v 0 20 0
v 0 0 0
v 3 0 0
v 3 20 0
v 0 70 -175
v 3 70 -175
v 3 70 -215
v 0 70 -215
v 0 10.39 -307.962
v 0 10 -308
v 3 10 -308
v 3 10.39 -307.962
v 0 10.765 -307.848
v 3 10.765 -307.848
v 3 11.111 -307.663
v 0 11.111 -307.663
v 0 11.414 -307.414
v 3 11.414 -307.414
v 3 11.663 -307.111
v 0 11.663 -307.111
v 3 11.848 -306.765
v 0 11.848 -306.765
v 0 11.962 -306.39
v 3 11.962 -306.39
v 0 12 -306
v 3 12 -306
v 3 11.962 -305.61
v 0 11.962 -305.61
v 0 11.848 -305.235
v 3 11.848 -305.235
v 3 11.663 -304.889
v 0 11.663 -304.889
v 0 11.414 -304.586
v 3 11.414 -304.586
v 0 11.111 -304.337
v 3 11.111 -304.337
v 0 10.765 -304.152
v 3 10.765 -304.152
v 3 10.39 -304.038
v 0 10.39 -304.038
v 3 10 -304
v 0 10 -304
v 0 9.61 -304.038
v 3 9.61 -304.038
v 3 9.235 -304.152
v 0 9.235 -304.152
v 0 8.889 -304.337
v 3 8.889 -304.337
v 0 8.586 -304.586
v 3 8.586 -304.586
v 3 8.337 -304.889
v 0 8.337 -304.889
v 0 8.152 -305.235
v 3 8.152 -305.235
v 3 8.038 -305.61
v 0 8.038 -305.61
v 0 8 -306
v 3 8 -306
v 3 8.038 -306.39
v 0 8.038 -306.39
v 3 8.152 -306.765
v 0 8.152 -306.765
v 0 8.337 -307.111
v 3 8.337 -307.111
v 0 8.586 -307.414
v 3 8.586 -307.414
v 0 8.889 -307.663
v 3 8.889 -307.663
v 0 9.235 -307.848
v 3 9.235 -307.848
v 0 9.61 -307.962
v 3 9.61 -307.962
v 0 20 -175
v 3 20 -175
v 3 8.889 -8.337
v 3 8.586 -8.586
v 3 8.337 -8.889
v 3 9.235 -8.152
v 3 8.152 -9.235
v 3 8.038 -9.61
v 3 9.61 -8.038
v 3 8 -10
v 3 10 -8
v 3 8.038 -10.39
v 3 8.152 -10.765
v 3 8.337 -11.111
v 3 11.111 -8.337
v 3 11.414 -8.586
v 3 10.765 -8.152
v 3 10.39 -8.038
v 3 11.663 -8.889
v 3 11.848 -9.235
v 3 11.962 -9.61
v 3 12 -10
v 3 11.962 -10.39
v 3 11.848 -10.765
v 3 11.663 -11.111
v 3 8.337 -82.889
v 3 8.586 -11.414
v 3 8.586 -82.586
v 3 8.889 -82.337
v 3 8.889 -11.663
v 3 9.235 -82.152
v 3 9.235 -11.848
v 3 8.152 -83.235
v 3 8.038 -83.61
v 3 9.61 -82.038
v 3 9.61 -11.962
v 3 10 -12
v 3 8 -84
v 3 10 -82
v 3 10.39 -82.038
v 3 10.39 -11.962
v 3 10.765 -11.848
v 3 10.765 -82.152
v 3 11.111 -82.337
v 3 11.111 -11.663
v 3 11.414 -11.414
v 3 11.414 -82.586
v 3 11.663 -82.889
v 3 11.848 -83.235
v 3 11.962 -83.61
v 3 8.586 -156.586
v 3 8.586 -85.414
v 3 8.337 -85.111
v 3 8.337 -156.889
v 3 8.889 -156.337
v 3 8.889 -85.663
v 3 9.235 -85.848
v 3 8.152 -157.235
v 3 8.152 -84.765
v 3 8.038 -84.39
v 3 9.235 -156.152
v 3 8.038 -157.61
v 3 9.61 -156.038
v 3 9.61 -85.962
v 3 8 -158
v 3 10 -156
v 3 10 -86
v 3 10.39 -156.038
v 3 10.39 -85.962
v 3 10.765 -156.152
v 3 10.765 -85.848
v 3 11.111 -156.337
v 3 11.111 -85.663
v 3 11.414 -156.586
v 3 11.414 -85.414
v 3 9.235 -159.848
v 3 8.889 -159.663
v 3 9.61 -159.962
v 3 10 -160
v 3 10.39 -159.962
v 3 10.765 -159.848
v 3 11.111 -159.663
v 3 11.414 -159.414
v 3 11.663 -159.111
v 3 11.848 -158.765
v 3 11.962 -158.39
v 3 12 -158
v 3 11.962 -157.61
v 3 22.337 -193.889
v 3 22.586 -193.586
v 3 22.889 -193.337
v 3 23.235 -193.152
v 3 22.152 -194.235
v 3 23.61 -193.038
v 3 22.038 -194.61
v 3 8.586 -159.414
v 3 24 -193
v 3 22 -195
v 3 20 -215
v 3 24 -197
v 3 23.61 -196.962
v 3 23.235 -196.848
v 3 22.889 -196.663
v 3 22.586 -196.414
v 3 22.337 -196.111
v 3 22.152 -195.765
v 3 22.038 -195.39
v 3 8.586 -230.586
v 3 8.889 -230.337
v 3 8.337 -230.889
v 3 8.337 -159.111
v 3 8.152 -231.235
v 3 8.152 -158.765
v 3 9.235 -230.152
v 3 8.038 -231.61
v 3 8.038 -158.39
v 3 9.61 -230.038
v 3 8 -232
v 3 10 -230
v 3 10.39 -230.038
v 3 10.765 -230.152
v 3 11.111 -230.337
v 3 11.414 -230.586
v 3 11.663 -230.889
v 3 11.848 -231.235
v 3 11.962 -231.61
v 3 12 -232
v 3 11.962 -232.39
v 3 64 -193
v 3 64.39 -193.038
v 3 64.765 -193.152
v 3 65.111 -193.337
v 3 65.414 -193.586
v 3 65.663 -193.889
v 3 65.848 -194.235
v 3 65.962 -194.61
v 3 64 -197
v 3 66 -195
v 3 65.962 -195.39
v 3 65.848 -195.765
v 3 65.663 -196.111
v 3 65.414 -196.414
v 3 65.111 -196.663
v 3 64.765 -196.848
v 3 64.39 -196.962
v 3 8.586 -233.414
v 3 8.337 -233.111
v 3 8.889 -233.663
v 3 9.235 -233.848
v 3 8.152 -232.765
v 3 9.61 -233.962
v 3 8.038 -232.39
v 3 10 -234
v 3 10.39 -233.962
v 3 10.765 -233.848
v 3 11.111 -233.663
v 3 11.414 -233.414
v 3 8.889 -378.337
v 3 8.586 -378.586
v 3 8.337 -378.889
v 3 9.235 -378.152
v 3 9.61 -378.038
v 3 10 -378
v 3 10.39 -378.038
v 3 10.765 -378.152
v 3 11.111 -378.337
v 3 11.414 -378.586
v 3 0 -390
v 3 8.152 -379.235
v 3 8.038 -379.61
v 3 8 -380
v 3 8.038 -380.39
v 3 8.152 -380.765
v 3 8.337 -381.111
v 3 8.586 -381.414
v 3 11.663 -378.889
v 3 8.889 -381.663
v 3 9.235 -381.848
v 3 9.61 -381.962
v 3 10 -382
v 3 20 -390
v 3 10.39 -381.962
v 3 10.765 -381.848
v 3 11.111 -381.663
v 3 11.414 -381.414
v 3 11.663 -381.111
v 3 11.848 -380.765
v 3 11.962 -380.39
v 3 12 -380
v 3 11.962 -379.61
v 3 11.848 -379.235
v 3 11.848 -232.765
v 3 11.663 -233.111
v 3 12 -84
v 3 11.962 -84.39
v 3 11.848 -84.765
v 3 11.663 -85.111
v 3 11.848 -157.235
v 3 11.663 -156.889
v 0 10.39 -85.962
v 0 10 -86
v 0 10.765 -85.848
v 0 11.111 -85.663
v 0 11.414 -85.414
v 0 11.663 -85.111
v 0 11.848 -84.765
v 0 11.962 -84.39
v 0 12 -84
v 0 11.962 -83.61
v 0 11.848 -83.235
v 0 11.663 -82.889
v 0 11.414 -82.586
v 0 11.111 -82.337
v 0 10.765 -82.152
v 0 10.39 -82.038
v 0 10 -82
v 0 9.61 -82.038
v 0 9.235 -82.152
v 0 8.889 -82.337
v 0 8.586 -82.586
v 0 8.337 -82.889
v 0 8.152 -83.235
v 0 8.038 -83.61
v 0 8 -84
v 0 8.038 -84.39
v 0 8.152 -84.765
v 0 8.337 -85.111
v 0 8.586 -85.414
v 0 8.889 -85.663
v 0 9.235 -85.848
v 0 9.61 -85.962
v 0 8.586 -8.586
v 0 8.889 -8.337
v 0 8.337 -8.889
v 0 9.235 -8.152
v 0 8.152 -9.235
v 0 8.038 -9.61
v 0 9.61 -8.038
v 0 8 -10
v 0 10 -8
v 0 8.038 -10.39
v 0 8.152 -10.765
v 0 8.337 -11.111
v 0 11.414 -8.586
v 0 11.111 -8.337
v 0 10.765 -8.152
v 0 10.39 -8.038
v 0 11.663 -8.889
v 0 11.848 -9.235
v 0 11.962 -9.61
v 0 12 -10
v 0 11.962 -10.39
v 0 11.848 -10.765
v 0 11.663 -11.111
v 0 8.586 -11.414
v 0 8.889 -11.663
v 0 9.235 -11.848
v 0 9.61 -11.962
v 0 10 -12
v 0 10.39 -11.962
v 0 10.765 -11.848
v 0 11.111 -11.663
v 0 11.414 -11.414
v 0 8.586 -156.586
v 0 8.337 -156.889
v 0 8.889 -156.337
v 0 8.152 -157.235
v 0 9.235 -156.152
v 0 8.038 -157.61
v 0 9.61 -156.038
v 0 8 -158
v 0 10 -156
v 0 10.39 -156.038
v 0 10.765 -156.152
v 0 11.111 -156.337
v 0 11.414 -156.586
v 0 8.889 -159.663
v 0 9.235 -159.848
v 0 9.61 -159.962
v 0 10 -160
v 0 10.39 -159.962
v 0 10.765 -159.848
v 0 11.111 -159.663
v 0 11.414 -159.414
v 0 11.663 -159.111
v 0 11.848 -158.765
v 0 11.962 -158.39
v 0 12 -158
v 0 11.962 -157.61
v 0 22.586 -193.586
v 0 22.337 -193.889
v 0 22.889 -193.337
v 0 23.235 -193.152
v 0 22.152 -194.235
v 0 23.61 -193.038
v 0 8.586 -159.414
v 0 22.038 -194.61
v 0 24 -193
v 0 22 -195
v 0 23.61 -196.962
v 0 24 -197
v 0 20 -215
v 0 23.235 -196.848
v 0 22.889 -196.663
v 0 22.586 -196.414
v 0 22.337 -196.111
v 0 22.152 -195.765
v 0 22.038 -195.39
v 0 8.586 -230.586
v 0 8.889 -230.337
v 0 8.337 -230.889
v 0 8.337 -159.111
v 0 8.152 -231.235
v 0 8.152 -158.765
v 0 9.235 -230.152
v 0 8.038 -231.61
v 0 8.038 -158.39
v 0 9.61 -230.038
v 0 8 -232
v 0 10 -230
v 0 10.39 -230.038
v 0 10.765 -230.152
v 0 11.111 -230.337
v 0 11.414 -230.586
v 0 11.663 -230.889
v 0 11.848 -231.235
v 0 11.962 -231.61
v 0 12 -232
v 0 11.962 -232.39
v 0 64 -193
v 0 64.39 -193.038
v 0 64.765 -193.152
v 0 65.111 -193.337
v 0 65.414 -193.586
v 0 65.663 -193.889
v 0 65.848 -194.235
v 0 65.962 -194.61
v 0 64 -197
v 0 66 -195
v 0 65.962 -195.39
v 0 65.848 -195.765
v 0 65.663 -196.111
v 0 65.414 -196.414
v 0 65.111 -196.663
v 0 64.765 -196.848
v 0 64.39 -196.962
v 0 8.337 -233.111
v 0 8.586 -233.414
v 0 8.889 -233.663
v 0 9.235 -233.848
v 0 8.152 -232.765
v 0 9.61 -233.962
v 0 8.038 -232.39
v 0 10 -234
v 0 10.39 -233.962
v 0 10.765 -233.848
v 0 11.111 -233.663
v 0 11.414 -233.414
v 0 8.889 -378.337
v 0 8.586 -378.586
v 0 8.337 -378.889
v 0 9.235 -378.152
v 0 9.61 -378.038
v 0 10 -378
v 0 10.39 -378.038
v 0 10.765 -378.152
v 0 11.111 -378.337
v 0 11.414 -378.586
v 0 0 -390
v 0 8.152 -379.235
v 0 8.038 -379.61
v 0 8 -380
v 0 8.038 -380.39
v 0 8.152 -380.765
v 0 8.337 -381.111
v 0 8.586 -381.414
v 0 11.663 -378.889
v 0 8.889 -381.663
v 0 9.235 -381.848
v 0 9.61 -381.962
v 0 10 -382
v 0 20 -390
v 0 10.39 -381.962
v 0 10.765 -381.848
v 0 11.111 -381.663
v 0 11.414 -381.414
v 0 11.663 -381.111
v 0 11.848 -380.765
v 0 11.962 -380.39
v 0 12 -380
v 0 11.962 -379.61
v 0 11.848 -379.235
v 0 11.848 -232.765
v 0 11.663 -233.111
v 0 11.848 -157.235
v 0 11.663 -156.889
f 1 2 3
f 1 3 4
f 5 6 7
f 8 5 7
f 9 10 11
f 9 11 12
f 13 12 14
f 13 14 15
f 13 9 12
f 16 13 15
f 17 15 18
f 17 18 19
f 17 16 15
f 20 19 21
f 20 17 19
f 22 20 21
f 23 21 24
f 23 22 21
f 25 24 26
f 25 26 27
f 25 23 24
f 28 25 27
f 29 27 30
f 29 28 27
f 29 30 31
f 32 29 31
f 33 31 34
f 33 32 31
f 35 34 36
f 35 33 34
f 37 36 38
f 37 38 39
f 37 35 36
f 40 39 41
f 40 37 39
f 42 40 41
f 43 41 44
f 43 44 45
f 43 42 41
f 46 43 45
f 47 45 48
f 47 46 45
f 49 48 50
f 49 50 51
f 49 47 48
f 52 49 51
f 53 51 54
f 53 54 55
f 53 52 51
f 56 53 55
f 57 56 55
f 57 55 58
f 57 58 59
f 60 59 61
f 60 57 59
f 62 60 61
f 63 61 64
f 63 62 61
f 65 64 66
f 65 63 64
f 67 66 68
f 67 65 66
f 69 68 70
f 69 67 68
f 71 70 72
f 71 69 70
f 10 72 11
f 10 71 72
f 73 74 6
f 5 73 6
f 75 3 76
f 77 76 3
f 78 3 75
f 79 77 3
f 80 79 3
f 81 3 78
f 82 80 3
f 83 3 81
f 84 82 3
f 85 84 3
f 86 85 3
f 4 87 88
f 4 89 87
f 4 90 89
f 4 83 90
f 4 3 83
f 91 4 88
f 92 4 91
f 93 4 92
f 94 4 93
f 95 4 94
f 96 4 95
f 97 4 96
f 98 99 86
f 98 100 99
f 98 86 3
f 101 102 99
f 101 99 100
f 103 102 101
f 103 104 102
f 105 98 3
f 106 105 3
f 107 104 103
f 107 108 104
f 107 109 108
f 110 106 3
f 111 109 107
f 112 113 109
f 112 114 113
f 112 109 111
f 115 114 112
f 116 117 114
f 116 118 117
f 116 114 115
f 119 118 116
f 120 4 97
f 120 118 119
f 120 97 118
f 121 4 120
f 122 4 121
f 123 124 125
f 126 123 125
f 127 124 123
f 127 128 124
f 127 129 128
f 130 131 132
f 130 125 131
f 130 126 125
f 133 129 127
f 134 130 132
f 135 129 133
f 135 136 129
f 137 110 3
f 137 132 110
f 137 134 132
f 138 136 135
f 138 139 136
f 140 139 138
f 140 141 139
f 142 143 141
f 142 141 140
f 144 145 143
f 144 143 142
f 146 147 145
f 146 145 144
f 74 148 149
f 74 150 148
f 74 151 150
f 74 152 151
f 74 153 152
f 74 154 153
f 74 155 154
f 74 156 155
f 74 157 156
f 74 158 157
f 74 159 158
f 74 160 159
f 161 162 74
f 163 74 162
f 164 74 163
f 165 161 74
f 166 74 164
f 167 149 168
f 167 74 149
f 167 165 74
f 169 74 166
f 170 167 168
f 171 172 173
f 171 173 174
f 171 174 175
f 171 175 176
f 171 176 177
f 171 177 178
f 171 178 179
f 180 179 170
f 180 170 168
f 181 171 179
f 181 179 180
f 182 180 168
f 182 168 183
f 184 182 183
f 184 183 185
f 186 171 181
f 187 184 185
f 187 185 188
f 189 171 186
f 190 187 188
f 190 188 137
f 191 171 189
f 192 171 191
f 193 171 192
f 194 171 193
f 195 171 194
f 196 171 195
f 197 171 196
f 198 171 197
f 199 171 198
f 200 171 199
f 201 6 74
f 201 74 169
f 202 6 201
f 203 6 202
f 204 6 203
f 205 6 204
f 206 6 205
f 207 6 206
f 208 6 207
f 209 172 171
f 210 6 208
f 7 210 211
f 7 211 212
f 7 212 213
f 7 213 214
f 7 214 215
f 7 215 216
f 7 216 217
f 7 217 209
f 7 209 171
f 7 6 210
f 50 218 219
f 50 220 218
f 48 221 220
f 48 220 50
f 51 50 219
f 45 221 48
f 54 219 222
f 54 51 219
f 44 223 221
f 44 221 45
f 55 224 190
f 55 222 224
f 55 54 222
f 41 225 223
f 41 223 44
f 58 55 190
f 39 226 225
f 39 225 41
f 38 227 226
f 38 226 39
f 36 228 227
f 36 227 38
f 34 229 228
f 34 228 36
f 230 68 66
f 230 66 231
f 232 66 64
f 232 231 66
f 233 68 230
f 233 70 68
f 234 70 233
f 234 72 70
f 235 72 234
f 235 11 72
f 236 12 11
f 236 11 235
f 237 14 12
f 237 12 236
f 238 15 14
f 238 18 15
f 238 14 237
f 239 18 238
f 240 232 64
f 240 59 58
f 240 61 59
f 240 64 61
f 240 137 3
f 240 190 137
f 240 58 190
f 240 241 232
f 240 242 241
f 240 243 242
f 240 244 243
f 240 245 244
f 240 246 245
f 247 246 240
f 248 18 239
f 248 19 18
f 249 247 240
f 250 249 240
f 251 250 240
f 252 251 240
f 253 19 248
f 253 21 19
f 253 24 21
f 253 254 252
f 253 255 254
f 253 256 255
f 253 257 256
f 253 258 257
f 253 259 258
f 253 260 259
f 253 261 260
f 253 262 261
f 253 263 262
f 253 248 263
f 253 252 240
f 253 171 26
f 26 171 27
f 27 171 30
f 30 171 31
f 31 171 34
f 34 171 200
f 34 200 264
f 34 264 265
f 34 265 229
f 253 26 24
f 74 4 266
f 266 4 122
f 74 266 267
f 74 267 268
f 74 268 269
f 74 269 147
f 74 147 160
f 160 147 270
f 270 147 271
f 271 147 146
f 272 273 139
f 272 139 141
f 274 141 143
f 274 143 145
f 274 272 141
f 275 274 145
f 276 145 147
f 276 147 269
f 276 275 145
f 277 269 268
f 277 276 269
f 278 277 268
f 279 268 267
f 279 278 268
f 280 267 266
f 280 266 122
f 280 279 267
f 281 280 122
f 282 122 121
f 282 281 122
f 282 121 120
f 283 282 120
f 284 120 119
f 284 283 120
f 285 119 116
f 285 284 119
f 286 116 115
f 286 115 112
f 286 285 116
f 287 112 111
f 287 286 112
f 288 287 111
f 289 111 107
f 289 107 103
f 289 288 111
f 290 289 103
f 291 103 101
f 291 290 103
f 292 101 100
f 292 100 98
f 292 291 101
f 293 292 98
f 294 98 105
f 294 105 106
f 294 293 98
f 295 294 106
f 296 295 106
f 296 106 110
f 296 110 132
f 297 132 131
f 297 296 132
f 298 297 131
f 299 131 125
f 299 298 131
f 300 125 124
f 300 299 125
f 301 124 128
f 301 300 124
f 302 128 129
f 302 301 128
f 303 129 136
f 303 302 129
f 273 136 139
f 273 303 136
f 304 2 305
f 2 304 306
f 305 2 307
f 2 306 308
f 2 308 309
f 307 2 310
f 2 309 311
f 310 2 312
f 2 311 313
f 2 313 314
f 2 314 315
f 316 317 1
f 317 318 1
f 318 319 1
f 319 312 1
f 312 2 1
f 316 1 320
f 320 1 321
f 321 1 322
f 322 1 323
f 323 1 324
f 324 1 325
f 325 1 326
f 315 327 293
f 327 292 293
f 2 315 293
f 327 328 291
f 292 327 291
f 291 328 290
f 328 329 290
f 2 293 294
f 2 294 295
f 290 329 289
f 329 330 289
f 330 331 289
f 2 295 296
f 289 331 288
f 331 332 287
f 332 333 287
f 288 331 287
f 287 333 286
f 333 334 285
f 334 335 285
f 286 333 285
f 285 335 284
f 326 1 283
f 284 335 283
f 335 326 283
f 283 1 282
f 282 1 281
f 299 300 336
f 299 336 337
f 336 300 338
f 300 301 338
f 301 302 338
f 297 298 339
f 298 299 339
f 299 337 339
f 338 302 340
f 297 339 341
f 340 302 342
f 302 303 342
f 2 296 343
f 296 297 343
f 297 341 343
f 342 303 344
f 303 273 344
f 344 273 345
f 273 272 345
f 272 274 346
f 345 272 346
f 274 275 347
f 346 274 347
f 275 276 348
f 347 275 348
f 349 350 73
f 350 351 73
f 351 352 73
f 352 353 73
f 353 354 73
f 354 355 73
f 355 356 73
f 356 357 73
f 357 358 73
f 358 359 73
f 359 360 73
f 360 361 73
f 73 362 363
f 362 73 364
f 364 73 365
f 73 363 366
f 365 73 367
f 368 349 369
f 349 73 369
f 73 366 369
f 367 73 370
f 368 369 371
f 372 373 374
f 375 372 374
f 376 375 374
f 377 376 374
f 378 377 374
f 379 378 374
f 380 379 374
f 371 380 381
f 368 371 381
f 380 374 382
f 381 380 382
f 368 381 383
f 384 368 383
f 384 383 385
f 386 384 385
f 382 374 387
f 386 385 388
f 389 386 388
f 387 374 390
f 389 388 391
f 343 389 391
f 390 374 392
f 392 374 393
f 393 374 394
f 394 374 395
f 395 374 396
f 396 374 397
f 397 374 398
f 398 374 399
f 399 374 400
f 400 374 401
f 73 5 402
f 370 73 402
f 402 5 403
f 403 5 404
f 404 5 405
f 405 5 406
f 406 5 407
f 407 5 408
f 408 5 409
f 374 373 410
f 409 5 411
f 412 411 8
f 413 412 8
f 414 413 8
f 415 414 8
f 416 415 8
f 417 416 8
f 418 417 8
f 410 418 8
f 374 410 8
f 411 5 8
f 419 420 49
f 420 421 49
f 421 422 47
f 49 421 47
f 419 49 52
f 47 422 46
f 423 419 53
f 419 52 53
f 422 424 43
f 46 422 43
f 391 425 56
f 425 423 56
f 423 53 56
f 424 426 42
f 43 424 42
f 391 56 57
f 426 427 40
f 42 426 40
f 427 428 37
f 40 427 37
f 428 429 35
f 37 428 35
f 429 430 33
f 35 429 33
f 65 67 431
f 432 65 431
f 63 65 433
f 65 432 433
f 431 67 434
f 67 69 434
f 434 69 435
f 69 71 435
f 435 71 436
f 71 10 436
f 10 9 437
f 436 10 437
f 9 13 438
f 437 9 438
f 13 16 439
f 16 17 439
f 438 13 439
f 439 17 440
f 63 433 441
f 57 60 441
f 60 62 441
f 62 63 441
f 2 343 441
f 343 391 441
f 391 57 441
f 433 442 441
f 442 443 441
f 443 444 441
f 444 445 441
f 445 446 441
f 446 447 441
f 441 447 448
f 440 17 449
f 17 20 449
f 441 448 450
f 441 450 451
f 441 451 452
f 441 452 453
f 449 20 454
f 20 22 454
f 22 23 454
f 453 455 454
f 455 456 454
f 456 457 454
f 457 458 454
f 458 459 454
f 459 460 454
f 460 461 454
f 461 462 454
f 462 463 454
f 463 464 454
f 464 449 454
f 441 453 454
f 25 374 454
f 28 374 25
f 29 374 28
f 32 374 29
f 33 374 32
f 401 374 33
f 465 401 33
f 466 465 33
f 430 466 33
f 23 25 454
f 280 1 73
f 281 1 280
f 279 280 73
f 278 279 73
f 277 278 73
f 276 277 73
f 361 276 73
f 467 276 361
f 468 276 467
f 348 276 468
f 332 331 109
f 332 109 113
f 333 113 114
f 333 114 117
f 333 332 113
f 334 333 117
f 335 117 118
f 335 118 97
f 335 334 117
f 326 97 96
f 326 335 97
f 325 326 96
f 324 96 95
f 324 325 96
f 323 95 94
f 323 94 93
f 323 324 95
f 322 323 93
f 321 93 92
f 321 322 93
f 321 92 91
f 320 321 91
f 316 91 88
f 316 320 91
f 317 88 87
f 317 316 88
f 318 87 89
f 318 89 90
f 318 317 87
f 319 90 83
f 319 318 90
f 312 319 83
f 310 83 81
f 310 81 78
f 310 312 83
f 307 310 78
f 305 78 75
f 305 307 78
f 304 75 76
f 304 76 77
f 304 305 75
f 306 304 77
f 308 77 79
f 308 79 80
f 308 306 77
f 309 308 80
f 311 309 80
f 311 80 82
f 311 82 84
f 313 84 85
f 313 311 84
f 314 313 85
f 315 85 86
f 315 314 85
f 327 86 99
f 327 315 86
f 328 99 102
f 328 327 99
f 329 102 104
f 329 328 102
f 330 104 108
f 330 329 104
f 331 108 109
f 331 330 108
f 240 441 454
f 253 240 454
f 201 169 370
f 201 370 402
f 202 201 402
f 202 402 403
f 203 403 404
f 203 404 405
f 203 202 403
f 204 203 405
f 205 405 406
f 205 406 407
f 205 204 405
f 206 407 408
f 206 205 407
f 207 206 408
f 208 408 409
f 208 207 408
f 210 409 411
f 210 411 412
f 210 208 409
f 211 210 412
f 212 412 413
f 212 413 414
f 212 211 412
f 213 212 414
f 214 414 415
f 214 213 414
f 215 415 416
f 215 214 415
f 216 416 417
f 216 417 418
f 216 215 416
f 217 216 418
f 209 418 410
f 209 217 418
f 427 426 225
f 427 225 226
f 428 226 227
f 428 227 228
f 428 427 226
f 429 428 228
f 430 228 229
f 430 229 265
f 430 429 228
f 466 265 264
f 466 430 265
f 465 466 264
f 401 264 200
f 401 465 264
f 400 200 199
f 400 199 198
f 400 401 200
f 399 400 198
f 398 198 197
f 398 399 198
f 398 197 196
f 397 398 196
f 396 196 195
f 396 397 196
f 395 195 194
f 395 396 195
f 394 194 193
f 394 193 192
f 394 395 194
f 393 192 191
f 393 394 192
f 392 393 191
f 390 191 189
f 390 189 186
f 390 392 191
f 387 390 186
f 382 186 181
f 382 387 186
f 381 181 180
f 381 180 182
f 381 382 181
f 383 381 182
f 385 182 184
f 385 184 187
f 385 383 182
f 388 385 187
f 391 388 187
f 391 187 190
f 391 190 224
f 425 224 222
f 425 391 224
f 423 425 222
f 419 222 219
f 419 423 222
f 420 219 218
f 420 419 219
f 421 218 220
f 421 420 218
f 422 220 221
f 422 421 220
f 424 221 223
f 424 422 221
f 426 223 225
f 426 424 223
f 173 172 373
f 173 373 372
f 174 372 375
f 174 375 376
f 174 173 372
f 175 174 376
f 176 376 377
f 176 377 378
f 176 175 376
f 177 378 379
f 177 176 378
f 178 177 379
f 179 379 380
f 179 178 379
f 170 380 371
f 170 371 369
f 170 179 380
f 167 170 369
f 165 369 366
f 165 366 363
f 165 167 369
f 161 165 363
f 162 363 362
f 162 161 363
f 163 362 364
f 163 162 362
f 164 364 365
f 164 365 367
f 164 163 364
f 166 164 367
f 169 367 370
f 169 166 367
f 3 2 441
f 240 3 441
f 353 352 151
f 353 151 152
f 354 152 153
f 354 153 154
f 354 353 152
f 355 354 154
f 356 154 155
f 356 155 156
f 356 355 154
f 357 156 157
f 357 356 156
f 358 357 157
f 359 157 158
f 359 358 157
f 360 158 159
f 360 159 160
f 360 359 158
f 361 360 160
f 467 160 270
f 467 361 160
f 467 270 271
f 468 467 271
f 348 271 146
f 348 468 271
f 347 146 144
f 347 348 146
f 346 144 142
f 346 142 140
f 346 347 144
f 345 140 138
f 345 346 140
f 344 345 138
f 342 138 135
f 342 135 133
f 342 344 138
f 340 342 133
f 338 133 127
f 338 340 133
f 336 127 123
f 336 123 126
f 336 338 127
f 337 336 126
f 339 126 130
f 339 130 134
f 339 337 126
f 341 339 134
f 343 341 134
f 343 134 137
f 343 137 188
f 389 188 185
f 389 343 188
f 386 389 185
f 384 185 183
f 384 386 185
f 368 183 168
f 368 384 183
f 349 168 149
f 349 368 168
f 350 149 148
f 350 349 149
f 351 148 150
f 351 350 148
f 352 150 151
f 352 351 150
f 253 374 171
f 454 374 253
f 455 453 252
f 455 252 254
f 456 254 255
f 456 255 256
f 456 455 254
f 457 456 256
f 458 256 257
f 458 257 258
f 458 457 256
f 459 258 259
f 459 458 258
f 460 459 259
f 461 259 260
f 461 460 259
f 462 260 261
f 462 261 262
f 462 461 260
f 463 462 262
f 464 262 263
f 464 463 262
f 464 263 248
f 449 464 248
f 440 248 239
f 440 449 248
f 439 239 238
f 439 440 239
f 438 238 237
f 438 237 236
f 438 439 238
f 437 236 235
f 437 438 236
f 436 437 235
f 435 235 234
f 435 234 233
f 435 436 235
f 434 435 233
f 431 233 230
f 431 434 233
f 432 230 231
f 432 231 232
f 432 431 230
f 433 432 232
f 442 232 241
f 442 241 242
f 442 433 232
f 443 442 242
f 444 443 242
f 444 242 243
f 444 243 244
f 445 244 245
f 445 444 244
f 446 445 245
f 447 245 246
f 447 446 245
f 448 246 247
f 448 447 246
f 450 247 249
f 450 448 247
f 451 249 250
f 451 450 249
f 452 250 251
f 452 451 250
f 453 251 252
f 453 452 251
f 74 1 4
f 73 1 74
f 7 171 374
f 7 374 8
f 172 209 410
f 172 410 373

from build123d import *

# Parameters (mm, degrees)
IZIM1_W                     = 390
IZIM1_H                     = 20
IZIM1_R                     = 2
Y_KSEKLIK_EKSTR_ZYON1_DEPTH = 3
IZIM2_W                     = 40
IZIM2_H                     = 50
Y_KSEKLIK_EKSTR_ZYON2_DEPTH = 3


with BuildPart() as part:
    # Çizim1 → Yükseklik-Ekstrüzyon1 (new body)
    with BuildSketch(Plane(origin=(0, 0, 0), x_dir=(0, 0, -1), z_dir=(1, 0, 0))):
        with Locations((195, 10)):
            Rectangle(IZIM1_W, IZIM1_H)
        with Locations((10, 10)):
            Circle(IZIM1_R, mode=Mode.SUBTRACT)
        with Locations((84, 10)):
            Circle(IZIM1_R, mode=Mode.SUBTRACT)
        with Locations((158, 10)):
            Circle(IZIM1_R, mode=Mode.SUBTRACT)
        with Locations((232, 10)):
            Circle(IZIM1_R, mode=Mode.SUBTRACT)
        with Locations((306, 10)):
            Circle(IZIM1_R, mode=Mode.SUBTRACT)
        with Locations((380, 10)):
            Circle(IZIM1_R, mode=Mode.SUBTRACT)
    extrude(amount=Y_KSEKLIK_EKSTR_ZYON1_DEPTH)

    # Çizim2 → Yükseklik-Ekstrüzyon2 (add)
    with BuildSketch(Plane(origin=(3, 0, 0), x_dir=(0, 0, -1), z_dir=(1, 0, 0))):
        with Locations((195, 45)):
            Rectangle(IZIM2_W, IZIM2_H)
        with BuildLine():
            Line((197, 64), (197, 24))
            ThreePointArc((197, 24), (195, 22), (193, 24))
            Line((193, 24), (193, 64))
            ThreePointArc((193, 64), (195, 66), (197, 64))
        make_face(mode=Mode.SUBTRACT)
    extrude(amount=-Y_KSEKLIK_EKSTR_ZYON2_DEPTH)


solid = part.part
